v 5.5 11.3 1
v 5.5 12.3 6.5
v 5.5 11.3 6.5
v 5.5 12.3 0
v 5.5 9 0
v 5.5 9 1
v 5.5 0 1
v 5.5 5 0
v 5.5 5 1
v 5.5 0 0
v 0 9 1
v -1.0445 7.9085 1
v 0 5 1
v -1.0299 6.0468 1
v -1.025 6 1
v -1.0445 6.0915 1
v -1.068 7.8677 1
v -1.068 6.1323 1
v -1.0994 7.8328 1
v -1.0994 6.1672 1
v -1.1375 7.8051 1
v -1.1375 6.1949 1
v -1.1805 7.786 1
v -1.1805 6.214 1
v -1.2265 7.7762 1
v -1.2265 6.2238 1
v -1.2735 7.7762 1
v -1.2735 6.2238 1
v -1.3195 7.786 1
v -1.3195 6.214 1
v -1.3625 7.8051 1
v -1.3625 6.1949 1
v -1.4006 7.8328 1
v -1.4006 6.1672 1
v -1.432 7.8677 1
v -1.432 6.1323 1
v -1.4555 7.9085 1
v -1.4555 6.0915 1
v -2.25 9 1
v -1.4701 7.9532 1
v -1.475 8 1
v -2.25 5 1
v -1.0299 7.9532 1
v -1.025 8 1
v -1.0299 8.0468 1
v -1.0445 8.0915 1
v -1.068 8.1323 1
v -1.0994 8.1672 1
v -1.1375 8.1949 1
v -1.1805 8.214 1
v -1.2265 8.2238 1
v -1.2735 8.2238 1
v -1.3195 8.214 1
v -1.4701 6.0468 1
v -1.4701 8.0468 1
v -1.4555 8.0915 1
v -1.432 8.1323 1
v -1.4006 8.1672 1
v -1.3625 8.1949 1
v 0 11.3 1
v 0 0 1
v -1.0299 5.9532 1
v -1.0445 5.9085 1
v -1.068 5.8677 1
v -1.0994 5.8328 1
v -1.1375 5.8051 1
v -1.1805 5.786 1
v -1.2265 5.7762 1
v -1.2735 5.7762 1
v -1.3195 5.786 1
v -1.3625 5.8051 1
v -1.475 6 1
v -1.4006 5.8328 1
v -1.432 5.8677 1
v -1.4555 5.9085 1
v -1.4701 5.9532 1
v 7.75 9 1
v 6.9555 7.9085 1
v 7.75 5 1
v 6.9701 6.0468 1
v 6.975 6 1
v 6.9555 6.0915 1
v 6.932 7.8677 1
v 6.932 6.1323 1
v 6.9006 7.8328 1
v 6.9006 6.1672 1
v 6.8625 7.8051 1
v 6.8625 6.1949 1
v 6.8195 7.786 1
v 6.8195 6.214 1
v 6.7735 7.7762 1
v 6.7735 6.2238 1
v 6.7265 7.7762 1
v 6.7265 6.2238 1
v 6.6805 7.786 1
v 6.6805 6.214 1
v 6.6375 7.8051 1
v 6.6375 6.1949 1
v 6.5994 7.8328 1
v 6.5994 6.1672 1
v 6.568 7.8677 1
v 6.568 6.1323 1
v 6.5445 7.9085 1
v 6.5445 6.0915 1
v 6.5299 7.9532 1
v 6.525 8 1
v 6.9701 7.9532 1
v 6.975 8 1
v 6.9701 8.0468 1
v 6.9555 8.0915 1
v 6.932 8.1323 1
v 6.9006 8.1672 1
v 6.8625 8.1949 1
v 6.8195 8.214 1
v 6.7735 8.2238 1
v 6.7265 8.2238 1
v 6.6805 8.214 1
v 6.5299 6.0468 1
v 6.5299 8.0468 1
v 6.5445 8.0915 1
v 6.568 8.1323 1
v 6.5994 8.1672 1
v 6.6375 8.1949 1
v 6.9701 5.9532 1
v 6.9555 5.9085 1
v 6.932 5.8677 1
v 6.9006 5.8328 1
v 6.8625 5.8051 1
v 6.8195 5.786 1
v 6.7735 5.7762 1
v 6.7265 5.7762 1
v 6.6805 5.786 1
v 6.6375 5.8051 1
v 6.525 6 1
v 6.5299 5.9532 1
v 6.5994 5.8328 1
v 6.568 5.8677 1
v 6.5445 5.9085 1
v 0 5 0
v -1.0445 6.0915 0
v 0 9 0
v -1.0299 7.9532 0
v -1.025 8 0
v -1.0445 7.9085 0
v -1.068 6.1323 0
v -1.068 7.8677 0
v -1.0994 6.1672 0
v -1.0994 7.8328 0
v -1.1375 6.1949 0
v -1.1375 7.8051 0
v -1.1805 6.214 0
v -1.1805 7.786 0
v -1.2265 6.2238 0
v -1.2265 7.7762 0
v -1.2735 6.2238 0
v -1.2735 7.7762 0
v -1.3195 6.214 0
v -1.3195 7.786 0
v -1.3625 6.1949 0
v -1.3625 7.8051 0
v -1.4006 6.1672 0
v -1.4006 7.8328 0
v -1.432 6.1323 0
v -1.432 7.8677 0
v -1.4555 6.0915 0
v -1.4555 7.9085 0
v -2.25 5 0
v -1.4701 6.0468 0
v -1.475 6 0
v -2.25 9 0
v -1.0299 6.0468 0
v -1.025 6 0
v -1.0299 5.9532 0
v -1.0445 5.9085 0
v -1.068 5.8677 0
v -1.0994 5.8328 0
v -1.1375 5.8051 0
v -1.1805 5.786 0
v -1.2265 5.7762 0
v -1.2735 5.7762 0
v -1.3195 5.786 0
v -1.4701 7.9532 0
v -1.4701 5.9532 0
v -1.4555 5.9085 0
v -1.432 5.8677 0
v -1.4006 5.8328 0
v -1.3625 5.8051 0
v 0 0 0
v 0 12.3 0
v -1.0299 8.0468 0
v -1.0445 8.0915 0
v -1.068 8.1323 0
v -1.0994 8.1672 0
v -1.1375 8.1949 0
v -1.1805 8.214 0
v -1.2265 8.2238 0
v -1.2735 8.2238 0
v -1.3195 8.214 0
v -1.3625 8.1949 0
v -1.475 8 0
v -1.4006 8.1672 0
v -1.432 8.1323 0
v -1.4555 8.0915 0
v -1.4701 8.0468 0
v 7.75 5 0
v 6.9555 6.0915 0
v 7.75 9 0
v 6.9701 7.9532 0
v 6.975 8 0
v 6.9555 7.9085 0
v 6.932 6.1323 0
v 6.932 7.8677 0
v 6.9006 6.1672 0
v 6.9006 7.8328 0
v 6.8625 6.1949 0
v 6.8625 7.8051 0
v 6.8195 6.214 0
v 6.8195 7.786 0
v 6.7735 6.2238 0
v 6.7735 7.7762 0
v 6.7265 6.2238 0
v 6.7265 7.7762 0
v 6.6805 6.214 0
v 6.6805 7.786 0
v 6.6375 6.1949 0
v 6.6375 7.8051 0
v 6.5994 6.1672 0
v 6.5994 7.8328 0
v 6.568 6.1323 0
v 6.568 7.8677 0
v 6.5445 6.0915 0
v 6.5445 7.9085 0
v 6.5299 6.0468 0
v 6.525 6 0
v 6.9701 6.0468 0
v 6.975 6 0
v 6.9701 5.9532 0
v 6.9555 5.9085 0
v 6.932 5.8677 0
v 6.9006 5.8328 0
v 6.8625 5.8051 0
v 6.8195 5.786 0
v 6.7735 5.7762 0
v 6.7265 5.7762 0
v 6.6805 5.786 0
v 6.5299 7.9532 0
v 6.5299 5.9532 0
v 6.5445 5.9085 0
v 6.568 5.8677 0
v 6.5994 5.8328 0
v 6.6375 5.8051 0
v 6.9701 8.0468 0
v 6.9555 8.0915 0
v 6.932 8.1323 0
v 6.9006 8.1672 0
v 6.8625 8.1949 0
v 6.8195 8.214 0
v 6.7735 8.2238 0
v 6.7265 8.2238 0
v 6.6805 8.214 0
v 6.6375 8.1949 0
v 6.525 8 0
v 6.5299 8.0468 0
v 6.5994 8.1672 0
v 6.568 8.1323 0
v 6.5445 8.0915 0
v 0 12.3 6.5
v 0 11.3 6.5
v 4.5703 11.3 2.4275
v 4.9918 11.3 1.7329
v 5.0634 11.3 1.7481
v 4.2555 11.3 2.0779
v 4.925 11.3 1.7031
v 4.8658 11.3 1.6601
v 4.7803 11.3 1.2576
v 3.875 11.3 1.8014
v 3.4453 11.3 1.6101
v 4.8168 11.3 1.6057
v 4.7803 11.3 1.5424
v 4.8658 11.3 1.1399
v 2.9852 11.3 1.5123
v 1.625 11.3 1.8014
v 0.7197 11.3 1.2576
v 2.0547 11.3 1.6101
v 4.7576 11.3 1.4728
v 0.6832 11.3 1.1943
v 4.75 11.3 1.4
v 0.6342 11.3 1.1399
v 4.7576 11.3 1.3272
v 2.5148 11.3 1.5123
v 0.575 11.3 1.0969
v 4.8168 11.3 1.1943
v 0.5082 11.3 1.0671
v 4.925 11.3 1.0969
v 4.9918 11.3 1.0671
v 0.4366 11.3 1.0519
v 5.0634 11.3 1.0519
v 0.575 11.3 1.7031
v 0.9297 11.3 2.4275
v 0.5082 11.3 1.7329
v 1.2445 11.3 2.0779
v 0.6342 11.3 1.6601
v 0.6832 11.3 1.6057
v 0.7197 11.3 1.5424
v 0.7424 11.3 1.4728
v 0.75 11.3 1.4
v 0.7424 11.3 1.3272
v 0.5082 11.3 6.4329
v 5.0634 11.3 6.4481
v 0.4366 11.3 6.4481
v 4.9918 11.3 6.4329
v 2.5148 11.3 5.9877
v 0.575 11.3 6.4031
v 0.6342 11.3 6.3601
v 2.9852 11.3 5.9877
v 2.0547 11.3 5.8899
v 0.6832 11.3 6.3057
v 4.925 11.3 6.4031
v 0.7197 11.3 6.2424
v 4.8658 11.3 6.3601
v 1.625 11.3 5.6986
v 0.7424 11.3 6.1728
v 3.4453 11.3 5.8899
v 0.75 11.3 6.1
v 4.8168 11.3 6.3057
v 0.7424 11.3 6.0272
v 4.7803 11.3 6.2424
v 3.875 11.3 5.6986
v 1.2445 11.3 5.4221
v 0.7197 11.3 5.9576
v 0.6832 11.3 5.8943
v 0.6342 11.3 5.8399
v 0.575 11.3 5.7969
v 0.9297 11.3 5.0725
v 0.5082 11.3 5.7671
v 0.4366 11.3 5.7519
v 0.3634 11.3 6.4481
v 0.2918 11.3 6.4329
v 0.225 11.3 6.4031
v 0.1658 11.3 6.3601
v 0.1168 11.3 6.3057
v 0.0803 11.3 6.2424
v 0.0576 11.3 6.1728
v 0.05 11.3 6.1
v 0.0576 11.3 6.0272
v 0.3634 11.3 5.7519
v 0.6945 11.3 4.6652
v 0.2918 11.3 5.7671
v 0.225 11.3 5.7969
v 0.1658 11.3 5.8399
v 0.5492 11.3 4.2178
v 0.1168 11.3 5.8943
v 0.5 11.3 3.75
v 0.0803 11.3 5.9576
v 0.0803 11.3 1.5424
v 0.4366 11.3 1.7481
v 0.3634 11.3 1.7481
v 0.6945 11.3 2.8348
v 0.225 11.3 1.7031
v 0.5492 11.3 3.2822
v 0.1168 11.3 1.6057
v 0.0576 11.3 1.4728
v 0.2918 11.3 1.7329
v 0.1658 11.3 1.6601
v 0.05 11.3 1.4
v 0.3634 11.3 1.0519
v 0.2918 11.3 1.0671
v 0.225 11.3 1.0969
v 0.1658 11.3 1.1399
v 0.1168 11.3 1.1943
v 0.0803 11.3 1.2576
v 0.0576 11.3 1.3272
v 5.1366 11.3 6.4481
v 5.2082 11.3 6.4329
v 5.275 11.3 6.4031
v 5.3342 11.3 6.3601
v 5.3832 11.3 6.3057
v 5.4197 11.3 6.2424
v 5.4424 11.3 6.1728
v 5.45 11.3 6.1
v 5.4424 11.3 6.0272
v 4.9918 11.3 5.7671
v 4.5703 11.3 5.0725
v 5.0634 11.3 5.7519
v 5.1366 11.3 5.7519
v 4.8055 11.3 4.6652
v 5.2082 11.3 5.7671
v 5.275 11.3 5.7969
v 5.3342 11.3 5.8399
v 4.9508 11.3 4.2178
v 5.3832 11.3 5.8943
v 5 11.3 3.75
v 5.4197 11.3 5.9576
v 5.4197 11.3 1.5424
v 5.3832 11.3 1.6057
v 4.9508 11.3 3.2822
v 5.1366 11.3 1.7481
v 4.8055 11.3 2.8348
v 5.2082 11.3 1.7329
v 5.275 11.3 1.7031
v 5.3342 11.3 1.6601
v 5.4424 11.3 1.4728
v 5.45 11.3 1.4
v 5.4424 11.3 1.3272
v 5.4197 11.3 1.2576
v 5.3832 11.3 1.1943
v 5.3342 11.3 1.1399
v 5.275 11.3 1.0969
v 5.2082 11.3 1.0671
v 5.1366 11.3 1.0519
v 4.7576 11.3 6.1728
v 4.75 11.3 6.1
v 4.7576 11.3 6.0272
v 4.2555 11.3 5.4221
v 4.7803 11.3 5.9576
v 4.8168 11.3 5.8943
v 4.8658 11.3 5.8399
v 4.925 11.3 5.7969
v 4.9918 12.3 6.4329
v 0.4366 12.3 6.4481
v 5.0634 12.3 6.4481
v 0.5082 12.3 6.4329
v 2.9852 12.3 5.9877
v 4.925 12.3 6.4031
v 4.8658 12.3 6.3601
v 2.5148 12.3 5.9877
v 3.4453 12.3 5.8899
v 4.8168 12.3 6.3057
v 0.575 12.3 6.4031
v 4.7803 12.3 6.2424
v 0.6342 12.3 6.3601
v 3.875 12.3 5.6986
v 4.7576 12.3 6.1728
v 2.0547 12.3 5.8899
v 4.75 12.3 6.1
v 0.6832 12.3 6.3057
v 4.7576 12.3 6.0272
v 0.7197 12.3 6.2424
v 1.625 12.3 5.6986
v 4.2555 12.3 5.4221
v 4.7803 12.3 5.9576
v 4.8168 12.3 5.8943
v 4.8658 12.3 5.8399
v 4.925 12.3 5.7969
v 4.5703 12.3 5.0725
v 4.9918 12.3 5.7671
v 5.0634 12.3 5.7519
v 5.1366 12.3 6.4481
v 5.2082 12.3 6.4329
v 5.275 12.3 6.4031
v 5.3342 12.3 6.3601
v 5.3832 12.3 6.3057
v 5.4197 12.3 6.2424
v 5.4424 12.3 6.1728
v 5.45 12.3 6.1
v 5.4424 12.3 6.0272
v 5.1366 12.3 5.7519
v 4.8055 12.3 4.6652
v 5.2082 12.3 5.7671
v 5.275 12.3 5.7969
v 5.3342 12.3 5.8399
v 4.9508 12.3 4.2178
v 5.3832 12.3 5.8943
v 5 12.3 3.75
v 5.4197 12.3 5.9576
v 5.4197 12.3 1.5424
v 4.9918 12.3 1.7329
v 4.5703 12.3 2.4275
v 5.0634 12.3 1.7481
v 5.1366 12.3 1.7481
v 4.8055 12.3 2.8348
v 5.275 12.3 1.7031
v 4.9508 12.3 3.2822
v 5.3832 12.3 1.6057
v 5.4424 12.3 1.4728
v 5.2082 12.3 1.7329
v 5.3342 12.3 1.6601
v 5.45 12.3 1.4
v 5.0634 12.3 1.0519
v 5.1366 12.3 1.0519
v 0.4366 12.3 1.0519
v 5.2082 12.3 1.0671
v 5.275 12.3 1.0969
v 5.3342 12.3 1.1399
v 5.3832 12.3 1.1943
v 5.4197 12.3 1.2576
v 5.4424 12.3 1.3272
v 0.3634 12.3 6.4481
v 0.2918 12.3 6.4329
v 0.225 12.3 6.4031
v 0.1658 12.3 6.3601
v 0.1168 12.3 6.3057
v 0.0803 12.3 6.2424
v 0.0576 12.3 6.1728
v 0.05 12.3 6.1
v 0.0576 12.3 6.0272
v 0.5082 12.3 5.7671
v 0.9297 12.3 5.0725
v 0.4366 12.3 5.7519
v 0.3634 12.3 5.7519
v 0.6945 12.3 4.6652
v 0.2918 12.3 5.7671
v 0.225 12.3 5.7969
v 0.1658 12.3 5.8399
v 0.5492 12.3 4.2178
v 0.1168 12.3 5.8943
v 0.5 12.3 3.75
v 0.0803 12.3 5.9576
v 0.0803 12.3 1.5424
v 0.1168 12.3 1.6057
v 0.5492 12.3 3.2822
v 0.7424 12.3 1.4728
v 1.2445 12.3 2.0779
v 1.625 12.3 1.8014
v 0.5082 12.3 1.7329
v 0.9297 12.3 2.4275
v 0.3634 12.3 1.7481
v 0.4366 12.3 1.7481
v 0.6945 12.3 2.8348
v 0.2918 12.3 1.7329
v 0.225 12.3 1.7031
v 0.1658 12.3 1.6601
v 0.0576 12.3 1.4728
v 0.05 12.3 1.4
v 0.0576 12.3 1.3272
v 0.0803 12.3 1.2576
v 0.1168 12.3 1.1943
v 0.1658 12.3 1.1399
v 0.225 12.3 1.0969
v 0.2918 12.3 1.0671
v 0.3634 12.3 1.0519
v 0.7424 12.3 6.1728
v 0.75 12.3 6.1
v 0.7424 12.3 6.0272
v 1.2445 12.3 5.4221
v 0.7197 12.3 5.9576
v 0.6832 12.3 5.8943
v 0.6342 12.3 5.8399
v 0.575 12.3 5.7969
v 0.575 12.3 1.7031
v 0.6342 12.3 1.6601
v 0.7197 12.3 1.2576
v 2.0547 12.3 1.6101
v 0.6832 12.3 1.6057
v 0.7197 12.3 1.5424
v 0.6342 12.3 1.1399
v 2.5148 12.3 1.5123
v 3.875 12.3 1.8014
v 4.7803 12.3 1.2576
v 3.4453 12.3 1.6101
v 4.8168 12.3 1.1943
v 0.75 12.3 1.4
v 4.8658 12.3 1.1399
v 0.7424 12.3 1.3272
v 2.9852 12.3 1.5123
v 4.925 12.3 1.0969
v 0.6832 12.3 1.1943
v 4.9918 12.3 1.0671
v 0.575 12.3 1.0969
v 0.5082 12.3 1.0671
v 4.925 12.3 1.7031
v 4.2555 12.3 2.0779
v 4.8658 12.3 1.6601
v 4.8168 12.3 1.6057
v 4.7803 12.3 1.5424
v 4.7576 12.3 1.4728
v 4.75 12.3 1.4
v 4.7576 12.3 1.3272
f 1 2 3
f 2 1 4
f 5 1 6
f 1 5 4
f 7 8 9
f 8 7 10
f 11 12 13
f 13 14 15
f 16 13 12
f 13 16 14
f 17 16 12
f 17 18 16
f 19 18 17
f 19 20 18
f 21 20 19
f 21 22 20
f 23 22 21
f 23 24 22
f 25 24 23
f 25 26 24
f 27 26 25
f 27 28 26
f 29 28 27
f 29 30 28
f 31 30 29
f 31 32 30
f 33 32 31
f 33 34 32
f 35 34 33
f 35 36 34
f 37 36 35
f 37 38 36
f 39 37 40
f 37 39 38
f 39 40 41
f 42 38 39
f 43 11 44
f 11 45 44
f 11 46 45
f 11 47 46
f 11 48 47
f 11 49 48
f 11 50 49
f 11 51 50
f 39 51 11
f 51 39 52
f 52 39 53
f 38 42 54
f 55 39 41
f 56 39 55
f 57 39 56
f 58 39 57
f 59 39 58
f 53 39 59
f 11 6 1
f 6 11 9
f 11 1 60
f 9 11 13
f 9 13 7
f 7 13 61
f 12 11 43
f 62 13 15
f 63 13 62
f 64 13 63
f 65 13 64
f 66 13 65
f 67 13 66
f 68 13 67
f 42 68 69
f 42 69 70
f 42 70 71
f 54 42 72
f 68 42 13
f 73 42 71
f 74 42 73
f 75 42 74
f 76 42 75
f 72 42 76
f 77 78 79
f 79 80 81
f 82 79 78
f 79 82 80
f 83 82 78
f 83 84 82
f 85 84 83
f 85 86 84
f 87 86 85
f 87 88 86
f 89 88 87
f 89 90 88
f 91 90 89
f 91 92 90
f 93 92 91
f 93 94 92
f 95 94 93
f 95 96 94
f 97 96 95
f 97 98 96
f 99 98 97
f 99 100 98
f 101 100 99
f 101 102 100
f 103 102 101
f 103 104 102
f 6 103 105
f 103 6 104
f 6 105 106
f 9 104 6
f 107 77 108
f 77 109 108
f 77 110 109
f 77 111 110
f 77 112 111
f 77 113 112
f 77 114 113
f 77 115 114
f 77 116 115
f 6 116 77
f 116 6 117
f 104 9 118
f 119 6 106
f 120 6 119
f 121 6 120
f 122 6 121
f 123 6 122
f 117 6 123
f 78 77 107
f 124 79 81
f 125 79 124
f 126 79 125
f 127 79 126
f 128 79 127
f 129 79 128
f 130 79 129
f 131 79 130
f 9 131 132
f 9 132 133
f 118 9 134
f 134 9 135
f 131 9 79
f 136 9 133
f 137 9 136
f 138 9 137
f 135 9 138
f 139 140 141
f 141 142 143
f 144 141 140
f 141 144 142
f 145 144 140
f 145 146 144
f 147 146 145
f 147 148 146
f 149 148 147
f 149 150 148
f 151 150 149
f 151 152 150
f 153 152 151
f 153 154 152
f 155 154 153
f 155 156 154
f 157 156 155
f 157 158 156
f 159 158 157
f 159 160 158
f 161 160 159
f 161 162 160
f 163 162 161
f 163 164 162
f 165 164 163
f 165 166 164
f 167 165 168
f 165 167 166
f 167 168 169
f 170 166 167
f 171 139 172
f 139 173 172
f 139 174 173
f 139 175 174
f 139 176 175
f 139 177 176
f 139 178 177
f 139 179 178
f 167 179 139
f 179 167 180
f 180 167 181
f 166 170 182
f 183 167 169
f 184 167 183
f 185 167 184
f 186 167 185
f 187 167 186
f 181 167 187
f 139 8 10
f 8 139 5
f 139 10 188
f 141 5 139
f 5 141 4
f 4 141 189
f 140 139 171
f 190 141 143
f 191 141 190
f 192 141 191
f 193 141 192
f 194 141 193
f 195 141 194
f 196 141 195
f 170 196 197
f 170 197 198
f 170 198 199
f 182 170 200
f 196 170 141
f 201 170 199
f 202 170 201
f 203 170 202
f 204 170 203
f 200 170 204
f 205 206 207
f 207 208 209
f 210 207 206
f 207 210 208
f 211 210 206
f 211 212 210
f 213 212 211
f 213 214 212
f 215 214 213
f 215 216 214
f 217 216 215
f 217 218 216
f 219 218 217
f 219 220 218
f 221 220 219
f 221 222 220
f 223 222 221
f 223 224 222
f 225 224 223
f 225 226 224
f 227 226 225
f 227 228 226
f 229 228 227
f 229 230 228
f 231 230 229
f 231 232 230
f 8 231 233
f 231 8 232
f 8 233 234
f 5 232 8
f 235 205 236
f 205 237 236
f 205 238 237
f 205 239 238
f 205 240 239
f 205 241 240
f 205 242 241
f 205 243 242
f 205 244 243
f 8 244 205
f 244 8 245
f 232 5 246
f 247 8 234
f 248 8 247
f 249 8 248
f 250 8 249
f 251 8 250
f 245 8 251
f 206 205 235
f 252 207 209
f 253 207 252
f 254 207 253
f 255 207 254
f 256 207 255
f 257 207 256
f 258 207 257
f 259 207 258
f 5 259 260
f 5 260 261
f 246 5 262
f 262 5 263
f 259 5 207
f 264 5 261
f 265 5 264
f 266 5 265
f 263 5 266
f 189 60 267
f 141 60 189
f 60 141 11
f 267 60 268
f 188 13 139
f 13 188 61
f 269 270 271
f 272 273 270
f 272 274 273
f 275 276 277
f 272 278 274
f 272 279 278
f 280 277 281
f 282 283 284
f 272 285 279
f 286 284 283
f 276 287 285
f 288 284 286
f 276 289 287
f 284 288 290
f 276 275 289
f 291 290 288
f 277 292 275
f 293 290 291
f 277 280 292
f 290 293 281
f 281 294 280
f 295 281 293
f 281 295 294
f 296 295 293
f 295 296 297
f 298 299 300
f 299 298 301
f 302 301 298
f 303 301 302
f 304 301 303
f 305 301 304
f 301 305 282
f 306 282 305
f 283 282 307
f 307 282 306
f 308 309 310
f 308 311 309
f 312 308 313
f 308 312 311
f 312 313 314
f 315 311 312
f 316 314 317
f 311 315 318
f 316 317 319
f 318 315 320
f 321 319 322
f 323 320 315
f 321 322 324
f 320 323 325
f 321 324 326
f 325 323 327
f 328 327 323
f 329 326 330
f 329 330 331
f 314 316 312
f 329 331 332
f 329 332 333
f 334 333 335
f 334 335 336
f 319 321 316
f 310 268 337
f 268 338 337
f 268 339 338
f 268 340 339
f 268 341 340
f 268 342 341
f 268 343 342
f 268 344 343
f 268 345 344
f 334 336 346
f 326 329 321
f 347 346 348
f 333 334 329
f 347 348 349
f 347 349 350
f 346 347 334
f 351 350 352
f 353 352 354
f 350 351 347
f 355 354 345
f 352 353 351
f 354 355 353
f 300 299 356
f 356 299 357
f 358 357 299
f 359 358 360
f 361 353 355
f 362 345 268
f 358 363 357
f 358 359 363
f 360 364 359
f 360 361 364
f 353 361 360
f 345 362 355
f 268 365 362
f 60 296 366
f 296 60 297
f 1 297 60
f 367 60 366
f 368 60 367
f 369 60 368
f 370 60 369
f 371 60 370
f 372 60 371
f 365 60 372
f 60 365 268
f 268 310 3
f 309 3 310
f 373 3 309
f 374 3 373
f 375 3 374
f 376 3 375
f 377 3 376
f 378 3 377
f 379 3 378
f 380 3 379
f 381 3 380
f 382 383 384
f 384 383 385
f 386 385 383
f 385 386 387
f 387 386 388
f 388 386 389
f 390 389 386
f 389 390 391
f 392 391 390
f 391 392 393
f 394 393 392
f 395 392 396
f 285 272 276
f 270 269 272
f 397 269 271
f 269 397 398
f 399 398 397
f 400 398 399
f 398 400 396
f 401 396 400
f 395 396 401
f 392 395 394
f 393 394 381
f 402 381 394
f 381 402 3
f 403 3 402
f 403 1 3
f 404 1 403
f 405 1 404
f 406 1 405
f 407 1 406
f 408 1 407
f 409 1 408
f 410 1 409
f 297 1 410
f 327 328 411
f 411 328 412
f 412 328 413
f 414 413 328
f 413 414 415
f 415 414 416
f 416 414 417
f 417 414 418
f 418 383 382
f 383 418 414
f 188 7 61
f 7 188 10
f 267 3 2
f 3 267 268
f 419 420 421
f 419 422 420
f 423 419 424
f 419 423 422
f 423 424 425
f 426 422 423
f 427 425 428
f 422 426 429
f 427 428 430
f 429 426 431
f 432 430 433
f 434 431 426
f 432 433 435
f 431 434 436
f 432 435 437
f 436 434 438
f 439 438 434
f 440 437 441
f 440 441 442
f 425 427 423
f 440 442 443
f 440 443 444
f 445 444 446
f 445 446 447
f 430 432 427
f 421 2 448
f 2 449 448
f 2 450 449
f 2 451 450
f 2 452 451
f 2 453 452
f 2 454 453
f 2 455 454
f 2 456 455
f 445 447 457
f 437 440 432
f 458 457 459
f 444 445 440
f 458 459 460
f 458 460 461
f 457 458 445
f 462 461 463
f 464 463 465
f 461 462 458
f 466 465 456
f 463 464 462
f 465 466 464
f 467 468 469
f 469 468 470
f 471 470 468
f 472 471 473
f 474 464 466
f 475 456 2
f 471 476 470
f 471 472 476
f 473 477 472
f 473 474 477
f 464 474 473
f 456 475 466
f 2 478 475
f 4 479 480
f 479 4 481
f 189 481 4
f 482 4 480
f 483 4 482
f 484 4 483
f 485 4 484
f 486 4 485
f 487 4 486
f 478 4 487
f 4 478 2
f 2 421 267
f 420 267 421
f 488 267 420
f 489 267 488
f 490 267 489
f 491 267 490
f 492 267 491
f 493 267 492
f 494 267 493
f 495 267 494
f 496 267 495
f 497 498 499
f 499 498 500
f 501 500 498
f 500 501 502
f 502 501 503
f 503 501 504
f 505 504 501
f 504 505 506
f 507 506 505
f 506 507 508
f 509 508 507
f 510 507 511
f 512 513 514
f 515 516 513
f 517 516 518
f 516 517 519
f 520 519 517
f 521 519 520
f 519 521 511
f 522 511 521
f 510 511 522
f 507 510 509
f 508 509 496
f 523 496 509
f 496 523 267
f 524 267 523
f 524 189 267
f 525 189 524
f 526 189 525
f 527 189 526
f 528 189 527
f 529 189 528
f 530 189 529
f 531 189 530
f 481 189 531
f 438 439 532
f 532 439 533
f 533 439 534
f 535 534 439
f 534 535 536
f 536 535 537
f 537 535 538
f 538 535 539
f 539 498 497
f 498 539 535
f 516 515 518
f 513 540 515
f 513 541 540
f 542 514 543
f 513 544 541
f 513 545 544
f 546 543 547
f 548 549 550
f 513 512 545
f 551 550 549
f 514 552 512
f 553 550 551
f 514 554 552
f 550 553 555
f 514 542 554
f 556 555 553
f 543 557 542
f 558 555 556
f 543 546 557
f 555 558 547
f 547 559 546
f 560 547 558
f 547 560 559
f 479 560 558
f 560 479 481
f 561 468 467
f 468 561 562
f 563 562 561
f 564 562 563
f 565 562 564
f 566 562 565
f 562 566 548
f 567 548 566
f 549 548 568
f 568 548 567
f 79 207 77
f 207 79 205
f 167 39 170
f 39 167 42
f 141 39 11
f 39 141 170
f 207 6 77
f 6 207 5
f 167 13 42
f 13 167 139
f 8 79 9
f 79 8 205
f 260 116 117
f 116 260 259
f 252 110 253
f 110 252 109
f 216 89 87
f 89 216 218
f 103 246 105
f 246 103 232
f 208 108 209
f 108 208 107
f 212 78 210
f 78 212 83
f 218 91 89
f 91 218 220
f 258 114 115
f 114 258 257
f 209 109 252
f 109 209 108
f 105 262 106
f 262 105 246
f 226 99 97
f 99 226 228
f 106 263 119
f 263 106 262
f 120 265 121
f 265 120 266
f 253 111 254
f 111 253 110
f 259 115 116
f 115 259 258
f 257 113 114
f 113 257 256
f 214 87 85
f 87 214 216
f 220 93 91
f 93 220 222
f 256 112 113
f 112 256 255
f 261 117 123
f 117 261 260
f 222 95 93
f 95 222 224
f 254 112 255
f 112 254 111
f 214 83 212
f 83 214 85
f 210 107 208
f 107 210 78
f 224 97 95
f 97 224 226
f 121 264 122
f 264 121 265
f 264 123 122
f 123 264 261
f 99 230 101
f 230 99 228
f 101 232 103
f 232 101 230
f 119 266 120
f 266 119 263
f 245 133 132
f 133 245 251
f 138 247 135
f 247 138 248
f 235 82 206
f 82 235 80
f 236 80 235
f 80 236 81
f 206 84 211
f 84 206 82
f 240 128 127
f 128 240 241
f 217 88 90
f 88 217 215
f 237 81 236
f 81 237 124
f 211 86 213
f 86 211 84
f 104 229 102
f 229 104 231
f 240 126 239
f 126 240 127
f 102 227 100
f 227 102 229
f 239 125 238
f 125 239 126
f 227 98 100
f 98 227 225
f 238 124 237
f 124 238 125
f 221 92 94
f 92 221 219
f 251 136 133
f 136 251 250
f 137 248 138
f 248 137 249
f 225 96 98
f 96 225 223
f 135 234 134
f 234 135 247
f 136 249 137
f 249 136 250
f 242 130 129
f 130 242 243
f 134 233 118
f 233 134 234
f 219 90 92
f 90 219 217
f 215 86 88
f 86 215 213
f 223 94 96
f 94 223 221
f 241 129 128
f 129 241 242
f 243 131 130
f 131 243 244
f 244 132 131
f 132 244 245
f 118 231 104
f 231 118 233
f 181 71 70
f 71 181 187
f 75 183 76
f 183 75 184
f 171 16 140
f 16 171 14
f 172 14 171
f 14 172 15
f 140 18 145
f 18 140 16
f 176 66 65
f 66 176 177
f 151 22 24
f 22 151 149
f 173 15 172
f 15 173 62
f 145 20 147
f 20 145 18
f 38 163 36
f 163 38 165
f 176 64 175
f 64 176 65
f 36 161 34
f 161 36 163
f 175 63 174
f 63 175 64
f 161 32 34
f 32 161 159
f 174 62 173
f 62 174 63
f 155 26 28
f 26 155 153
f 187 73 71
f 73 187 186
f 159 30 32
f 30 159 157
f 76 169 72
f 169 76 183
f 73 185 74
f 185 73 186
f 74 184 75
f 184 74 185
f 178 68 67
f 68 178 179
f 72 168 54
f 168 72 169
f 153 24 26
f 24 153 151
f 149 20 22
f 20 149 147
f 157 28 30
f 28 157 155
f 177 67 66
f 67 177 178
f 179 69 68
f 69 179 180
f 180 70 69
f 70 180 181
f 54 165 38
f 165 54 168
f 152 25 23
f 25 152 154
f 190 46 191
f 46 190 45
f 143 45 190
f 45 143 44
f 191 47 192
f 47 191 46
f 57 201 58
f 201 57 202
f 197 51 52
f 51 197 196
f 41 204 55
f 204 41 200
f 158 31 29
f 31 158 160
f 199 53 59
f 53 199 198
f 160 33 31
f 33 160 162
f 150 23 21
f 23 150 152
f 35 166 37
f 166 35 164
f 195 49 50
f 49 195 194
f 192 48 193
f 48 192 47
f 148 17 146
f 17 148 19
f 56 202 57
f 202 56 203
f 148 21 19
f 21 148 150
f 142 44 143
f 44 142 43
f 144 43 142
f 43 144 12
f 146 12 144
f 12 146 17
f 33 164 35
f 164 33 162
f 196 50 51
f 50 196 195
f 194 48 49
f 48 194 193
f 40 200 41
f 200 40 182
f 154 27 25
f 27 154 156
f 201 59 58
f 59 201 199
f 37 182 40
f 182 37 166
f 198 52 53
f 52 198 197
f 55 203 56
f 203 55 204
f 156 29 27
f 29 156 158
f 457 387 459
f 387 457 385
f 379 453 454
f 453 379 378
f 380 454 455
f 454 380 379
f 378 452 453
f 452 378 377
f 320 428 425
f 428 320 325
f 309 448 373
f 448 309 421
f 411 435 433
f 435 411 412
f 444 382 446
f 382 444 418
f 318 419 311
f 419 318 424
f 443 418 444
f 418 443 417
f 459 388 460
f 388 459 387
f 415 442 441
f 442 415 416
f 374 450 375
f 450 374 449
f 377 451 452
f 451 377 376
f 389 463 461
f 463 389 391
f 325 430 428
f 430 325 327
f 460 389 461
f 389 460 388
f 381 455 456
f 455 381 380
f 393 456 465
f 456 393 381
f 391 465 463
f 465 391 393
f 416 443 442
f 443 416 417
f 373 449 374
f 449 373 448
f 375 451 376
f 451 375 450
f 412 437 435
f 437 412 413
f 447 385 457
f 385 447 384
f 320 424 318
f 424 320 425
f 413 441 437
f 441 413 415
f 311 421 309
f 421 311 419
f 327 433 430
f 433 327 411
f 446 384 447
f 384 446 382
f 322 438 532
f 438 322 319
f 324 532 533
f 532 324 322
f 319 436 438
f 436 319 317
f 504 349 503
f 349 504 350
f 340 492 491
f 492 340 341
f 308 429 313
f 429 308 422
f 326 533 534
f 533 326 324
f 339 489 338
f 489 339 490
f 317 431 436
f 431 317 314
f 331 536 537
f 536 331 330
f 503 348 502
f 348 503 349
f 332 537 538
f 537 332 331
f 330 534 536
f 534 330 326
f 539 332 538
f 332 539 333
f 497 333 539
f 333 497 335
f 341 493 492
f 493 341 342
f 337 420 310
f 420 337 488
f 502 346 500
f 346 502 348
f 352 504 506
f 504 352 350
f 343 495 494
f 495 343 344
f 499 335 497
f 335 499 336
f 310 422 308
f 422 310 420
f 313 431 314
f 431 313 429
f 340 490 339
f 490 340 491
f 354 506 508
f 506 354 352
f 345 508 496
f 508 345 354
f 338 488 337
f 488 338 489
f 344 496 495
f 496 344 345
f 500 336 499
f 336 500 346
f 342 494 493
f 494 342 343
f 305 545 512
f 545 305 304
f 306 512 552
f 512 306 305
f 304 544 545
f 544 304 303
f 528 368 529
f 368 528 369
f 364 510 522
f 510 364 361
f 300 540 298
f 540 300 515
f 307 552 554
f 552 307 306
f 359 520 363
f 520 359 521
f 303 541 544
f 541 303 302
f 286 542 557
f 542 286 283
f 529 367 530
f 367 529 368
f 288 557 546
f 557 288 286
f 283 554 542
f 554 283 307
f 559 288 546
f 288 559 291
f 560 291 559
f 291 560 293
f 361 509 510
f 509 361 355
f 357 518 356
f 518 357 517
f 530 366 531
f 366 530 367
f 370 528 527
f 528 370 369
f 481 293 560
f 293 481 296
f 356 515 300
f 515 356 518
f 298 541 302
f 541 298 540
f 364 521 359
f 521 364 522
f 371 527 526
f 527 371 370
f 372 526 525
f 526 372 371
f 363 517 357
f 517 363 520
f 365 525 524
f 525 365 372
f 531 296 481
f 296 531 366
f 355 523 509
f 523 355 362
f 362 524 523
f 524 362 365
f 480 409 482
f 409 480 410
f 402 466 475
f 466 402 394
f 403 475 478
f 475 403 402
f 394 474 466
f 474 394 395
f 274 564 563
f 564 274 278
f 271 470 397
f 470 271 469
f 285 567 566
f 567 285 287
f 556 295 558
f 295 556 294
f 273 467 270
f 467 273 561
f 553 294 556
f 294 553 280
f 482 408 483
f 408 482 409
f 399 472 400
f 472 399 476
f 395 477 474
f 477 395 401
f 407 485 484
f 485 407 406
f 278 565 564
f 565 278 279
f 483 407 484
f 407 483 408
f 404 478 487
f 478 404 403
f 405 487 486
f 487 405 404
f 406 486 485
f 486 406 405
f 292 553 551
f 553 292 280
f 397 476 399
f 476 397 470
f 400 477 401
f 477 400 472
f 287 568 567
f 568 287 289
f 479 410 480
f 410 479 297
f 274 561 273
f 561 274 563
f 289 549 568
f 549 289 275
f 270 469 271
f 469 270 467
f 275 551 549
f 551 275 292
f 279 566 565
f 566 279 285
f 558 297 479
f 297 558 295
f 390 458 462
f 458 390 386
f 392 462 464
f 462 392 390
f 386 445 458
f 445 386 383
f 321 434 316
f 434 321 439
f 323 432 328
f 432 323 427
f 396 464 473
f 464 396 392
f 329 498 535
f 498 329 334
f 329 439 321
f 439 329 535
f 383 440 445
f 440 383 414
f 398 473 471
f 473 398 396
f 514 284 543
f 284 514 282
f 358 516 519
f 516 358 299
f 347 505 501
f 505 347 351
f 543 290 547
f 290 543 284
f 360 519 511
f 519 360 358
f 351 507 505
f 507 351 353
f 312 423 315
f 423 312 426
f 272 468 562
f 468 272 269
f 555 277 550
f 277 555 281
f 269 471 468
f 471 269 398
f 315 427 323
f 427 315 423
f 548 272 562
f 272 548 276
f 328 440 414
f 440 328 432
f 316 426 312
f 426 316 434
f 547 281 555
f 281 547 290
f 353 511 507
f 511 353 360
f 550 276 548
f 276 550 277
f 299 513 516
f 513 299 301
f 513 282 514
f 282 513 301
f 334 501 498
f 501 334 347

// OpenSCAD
$fn=30;
thickness = 1;
motor_face = 5.5;
motor_length = 11.3;

wing_width = 10;
wing_depth = 4;

difference() {
	union() {
		cube([motor_face, motor_length, thickness]);
		translate([0, motor_length, 0]) cube([motor_face,1, motor_face + thickness]);
		translate([-wing_width/2 + motor_face/2, 5, 0]) cube([wing_width, wing_depth, thickness]);
	}

	translate([motor_face/2, 5+wing_depth/2, 0]) {
		translate([wing_width/2-1, 1, 0]) cylinder(d=0.45, h=3, center=true);
		translate([wing_width/2-1, -1, 0]) cylinder(d=0.45, h=3, center=true);
		translate([-wing_width/2+1, -1, 0]) cylinder(d=0.45, h=3, center=true);
		translate([-wing_width/2+1, 1, 0]) cylinder(d=0.45, h=3, center=true);
	}
	translate([motor_face/2, motor_length, thickness + motor_face/2]){
		rotate([90, 0, 0]) {
			union() {
				translate([4.7/2,4.7/2,0]) cylinder(d=0.7, h=4, center=true);
				translate([-4.7/2,4.7/2,0]) cylinder(d=0.7, h=4, center=true);
				translate([-4.7/2,-4.7/2,0]) cylinder(d=0.7, h=4, center=true);
				translate([4.7/2,-4.7/2,0]) cylinder(d=0.7, h=4, center=true);
				cylinder(d=4.5, h=4, center=true);
			}
		}
	}
}
